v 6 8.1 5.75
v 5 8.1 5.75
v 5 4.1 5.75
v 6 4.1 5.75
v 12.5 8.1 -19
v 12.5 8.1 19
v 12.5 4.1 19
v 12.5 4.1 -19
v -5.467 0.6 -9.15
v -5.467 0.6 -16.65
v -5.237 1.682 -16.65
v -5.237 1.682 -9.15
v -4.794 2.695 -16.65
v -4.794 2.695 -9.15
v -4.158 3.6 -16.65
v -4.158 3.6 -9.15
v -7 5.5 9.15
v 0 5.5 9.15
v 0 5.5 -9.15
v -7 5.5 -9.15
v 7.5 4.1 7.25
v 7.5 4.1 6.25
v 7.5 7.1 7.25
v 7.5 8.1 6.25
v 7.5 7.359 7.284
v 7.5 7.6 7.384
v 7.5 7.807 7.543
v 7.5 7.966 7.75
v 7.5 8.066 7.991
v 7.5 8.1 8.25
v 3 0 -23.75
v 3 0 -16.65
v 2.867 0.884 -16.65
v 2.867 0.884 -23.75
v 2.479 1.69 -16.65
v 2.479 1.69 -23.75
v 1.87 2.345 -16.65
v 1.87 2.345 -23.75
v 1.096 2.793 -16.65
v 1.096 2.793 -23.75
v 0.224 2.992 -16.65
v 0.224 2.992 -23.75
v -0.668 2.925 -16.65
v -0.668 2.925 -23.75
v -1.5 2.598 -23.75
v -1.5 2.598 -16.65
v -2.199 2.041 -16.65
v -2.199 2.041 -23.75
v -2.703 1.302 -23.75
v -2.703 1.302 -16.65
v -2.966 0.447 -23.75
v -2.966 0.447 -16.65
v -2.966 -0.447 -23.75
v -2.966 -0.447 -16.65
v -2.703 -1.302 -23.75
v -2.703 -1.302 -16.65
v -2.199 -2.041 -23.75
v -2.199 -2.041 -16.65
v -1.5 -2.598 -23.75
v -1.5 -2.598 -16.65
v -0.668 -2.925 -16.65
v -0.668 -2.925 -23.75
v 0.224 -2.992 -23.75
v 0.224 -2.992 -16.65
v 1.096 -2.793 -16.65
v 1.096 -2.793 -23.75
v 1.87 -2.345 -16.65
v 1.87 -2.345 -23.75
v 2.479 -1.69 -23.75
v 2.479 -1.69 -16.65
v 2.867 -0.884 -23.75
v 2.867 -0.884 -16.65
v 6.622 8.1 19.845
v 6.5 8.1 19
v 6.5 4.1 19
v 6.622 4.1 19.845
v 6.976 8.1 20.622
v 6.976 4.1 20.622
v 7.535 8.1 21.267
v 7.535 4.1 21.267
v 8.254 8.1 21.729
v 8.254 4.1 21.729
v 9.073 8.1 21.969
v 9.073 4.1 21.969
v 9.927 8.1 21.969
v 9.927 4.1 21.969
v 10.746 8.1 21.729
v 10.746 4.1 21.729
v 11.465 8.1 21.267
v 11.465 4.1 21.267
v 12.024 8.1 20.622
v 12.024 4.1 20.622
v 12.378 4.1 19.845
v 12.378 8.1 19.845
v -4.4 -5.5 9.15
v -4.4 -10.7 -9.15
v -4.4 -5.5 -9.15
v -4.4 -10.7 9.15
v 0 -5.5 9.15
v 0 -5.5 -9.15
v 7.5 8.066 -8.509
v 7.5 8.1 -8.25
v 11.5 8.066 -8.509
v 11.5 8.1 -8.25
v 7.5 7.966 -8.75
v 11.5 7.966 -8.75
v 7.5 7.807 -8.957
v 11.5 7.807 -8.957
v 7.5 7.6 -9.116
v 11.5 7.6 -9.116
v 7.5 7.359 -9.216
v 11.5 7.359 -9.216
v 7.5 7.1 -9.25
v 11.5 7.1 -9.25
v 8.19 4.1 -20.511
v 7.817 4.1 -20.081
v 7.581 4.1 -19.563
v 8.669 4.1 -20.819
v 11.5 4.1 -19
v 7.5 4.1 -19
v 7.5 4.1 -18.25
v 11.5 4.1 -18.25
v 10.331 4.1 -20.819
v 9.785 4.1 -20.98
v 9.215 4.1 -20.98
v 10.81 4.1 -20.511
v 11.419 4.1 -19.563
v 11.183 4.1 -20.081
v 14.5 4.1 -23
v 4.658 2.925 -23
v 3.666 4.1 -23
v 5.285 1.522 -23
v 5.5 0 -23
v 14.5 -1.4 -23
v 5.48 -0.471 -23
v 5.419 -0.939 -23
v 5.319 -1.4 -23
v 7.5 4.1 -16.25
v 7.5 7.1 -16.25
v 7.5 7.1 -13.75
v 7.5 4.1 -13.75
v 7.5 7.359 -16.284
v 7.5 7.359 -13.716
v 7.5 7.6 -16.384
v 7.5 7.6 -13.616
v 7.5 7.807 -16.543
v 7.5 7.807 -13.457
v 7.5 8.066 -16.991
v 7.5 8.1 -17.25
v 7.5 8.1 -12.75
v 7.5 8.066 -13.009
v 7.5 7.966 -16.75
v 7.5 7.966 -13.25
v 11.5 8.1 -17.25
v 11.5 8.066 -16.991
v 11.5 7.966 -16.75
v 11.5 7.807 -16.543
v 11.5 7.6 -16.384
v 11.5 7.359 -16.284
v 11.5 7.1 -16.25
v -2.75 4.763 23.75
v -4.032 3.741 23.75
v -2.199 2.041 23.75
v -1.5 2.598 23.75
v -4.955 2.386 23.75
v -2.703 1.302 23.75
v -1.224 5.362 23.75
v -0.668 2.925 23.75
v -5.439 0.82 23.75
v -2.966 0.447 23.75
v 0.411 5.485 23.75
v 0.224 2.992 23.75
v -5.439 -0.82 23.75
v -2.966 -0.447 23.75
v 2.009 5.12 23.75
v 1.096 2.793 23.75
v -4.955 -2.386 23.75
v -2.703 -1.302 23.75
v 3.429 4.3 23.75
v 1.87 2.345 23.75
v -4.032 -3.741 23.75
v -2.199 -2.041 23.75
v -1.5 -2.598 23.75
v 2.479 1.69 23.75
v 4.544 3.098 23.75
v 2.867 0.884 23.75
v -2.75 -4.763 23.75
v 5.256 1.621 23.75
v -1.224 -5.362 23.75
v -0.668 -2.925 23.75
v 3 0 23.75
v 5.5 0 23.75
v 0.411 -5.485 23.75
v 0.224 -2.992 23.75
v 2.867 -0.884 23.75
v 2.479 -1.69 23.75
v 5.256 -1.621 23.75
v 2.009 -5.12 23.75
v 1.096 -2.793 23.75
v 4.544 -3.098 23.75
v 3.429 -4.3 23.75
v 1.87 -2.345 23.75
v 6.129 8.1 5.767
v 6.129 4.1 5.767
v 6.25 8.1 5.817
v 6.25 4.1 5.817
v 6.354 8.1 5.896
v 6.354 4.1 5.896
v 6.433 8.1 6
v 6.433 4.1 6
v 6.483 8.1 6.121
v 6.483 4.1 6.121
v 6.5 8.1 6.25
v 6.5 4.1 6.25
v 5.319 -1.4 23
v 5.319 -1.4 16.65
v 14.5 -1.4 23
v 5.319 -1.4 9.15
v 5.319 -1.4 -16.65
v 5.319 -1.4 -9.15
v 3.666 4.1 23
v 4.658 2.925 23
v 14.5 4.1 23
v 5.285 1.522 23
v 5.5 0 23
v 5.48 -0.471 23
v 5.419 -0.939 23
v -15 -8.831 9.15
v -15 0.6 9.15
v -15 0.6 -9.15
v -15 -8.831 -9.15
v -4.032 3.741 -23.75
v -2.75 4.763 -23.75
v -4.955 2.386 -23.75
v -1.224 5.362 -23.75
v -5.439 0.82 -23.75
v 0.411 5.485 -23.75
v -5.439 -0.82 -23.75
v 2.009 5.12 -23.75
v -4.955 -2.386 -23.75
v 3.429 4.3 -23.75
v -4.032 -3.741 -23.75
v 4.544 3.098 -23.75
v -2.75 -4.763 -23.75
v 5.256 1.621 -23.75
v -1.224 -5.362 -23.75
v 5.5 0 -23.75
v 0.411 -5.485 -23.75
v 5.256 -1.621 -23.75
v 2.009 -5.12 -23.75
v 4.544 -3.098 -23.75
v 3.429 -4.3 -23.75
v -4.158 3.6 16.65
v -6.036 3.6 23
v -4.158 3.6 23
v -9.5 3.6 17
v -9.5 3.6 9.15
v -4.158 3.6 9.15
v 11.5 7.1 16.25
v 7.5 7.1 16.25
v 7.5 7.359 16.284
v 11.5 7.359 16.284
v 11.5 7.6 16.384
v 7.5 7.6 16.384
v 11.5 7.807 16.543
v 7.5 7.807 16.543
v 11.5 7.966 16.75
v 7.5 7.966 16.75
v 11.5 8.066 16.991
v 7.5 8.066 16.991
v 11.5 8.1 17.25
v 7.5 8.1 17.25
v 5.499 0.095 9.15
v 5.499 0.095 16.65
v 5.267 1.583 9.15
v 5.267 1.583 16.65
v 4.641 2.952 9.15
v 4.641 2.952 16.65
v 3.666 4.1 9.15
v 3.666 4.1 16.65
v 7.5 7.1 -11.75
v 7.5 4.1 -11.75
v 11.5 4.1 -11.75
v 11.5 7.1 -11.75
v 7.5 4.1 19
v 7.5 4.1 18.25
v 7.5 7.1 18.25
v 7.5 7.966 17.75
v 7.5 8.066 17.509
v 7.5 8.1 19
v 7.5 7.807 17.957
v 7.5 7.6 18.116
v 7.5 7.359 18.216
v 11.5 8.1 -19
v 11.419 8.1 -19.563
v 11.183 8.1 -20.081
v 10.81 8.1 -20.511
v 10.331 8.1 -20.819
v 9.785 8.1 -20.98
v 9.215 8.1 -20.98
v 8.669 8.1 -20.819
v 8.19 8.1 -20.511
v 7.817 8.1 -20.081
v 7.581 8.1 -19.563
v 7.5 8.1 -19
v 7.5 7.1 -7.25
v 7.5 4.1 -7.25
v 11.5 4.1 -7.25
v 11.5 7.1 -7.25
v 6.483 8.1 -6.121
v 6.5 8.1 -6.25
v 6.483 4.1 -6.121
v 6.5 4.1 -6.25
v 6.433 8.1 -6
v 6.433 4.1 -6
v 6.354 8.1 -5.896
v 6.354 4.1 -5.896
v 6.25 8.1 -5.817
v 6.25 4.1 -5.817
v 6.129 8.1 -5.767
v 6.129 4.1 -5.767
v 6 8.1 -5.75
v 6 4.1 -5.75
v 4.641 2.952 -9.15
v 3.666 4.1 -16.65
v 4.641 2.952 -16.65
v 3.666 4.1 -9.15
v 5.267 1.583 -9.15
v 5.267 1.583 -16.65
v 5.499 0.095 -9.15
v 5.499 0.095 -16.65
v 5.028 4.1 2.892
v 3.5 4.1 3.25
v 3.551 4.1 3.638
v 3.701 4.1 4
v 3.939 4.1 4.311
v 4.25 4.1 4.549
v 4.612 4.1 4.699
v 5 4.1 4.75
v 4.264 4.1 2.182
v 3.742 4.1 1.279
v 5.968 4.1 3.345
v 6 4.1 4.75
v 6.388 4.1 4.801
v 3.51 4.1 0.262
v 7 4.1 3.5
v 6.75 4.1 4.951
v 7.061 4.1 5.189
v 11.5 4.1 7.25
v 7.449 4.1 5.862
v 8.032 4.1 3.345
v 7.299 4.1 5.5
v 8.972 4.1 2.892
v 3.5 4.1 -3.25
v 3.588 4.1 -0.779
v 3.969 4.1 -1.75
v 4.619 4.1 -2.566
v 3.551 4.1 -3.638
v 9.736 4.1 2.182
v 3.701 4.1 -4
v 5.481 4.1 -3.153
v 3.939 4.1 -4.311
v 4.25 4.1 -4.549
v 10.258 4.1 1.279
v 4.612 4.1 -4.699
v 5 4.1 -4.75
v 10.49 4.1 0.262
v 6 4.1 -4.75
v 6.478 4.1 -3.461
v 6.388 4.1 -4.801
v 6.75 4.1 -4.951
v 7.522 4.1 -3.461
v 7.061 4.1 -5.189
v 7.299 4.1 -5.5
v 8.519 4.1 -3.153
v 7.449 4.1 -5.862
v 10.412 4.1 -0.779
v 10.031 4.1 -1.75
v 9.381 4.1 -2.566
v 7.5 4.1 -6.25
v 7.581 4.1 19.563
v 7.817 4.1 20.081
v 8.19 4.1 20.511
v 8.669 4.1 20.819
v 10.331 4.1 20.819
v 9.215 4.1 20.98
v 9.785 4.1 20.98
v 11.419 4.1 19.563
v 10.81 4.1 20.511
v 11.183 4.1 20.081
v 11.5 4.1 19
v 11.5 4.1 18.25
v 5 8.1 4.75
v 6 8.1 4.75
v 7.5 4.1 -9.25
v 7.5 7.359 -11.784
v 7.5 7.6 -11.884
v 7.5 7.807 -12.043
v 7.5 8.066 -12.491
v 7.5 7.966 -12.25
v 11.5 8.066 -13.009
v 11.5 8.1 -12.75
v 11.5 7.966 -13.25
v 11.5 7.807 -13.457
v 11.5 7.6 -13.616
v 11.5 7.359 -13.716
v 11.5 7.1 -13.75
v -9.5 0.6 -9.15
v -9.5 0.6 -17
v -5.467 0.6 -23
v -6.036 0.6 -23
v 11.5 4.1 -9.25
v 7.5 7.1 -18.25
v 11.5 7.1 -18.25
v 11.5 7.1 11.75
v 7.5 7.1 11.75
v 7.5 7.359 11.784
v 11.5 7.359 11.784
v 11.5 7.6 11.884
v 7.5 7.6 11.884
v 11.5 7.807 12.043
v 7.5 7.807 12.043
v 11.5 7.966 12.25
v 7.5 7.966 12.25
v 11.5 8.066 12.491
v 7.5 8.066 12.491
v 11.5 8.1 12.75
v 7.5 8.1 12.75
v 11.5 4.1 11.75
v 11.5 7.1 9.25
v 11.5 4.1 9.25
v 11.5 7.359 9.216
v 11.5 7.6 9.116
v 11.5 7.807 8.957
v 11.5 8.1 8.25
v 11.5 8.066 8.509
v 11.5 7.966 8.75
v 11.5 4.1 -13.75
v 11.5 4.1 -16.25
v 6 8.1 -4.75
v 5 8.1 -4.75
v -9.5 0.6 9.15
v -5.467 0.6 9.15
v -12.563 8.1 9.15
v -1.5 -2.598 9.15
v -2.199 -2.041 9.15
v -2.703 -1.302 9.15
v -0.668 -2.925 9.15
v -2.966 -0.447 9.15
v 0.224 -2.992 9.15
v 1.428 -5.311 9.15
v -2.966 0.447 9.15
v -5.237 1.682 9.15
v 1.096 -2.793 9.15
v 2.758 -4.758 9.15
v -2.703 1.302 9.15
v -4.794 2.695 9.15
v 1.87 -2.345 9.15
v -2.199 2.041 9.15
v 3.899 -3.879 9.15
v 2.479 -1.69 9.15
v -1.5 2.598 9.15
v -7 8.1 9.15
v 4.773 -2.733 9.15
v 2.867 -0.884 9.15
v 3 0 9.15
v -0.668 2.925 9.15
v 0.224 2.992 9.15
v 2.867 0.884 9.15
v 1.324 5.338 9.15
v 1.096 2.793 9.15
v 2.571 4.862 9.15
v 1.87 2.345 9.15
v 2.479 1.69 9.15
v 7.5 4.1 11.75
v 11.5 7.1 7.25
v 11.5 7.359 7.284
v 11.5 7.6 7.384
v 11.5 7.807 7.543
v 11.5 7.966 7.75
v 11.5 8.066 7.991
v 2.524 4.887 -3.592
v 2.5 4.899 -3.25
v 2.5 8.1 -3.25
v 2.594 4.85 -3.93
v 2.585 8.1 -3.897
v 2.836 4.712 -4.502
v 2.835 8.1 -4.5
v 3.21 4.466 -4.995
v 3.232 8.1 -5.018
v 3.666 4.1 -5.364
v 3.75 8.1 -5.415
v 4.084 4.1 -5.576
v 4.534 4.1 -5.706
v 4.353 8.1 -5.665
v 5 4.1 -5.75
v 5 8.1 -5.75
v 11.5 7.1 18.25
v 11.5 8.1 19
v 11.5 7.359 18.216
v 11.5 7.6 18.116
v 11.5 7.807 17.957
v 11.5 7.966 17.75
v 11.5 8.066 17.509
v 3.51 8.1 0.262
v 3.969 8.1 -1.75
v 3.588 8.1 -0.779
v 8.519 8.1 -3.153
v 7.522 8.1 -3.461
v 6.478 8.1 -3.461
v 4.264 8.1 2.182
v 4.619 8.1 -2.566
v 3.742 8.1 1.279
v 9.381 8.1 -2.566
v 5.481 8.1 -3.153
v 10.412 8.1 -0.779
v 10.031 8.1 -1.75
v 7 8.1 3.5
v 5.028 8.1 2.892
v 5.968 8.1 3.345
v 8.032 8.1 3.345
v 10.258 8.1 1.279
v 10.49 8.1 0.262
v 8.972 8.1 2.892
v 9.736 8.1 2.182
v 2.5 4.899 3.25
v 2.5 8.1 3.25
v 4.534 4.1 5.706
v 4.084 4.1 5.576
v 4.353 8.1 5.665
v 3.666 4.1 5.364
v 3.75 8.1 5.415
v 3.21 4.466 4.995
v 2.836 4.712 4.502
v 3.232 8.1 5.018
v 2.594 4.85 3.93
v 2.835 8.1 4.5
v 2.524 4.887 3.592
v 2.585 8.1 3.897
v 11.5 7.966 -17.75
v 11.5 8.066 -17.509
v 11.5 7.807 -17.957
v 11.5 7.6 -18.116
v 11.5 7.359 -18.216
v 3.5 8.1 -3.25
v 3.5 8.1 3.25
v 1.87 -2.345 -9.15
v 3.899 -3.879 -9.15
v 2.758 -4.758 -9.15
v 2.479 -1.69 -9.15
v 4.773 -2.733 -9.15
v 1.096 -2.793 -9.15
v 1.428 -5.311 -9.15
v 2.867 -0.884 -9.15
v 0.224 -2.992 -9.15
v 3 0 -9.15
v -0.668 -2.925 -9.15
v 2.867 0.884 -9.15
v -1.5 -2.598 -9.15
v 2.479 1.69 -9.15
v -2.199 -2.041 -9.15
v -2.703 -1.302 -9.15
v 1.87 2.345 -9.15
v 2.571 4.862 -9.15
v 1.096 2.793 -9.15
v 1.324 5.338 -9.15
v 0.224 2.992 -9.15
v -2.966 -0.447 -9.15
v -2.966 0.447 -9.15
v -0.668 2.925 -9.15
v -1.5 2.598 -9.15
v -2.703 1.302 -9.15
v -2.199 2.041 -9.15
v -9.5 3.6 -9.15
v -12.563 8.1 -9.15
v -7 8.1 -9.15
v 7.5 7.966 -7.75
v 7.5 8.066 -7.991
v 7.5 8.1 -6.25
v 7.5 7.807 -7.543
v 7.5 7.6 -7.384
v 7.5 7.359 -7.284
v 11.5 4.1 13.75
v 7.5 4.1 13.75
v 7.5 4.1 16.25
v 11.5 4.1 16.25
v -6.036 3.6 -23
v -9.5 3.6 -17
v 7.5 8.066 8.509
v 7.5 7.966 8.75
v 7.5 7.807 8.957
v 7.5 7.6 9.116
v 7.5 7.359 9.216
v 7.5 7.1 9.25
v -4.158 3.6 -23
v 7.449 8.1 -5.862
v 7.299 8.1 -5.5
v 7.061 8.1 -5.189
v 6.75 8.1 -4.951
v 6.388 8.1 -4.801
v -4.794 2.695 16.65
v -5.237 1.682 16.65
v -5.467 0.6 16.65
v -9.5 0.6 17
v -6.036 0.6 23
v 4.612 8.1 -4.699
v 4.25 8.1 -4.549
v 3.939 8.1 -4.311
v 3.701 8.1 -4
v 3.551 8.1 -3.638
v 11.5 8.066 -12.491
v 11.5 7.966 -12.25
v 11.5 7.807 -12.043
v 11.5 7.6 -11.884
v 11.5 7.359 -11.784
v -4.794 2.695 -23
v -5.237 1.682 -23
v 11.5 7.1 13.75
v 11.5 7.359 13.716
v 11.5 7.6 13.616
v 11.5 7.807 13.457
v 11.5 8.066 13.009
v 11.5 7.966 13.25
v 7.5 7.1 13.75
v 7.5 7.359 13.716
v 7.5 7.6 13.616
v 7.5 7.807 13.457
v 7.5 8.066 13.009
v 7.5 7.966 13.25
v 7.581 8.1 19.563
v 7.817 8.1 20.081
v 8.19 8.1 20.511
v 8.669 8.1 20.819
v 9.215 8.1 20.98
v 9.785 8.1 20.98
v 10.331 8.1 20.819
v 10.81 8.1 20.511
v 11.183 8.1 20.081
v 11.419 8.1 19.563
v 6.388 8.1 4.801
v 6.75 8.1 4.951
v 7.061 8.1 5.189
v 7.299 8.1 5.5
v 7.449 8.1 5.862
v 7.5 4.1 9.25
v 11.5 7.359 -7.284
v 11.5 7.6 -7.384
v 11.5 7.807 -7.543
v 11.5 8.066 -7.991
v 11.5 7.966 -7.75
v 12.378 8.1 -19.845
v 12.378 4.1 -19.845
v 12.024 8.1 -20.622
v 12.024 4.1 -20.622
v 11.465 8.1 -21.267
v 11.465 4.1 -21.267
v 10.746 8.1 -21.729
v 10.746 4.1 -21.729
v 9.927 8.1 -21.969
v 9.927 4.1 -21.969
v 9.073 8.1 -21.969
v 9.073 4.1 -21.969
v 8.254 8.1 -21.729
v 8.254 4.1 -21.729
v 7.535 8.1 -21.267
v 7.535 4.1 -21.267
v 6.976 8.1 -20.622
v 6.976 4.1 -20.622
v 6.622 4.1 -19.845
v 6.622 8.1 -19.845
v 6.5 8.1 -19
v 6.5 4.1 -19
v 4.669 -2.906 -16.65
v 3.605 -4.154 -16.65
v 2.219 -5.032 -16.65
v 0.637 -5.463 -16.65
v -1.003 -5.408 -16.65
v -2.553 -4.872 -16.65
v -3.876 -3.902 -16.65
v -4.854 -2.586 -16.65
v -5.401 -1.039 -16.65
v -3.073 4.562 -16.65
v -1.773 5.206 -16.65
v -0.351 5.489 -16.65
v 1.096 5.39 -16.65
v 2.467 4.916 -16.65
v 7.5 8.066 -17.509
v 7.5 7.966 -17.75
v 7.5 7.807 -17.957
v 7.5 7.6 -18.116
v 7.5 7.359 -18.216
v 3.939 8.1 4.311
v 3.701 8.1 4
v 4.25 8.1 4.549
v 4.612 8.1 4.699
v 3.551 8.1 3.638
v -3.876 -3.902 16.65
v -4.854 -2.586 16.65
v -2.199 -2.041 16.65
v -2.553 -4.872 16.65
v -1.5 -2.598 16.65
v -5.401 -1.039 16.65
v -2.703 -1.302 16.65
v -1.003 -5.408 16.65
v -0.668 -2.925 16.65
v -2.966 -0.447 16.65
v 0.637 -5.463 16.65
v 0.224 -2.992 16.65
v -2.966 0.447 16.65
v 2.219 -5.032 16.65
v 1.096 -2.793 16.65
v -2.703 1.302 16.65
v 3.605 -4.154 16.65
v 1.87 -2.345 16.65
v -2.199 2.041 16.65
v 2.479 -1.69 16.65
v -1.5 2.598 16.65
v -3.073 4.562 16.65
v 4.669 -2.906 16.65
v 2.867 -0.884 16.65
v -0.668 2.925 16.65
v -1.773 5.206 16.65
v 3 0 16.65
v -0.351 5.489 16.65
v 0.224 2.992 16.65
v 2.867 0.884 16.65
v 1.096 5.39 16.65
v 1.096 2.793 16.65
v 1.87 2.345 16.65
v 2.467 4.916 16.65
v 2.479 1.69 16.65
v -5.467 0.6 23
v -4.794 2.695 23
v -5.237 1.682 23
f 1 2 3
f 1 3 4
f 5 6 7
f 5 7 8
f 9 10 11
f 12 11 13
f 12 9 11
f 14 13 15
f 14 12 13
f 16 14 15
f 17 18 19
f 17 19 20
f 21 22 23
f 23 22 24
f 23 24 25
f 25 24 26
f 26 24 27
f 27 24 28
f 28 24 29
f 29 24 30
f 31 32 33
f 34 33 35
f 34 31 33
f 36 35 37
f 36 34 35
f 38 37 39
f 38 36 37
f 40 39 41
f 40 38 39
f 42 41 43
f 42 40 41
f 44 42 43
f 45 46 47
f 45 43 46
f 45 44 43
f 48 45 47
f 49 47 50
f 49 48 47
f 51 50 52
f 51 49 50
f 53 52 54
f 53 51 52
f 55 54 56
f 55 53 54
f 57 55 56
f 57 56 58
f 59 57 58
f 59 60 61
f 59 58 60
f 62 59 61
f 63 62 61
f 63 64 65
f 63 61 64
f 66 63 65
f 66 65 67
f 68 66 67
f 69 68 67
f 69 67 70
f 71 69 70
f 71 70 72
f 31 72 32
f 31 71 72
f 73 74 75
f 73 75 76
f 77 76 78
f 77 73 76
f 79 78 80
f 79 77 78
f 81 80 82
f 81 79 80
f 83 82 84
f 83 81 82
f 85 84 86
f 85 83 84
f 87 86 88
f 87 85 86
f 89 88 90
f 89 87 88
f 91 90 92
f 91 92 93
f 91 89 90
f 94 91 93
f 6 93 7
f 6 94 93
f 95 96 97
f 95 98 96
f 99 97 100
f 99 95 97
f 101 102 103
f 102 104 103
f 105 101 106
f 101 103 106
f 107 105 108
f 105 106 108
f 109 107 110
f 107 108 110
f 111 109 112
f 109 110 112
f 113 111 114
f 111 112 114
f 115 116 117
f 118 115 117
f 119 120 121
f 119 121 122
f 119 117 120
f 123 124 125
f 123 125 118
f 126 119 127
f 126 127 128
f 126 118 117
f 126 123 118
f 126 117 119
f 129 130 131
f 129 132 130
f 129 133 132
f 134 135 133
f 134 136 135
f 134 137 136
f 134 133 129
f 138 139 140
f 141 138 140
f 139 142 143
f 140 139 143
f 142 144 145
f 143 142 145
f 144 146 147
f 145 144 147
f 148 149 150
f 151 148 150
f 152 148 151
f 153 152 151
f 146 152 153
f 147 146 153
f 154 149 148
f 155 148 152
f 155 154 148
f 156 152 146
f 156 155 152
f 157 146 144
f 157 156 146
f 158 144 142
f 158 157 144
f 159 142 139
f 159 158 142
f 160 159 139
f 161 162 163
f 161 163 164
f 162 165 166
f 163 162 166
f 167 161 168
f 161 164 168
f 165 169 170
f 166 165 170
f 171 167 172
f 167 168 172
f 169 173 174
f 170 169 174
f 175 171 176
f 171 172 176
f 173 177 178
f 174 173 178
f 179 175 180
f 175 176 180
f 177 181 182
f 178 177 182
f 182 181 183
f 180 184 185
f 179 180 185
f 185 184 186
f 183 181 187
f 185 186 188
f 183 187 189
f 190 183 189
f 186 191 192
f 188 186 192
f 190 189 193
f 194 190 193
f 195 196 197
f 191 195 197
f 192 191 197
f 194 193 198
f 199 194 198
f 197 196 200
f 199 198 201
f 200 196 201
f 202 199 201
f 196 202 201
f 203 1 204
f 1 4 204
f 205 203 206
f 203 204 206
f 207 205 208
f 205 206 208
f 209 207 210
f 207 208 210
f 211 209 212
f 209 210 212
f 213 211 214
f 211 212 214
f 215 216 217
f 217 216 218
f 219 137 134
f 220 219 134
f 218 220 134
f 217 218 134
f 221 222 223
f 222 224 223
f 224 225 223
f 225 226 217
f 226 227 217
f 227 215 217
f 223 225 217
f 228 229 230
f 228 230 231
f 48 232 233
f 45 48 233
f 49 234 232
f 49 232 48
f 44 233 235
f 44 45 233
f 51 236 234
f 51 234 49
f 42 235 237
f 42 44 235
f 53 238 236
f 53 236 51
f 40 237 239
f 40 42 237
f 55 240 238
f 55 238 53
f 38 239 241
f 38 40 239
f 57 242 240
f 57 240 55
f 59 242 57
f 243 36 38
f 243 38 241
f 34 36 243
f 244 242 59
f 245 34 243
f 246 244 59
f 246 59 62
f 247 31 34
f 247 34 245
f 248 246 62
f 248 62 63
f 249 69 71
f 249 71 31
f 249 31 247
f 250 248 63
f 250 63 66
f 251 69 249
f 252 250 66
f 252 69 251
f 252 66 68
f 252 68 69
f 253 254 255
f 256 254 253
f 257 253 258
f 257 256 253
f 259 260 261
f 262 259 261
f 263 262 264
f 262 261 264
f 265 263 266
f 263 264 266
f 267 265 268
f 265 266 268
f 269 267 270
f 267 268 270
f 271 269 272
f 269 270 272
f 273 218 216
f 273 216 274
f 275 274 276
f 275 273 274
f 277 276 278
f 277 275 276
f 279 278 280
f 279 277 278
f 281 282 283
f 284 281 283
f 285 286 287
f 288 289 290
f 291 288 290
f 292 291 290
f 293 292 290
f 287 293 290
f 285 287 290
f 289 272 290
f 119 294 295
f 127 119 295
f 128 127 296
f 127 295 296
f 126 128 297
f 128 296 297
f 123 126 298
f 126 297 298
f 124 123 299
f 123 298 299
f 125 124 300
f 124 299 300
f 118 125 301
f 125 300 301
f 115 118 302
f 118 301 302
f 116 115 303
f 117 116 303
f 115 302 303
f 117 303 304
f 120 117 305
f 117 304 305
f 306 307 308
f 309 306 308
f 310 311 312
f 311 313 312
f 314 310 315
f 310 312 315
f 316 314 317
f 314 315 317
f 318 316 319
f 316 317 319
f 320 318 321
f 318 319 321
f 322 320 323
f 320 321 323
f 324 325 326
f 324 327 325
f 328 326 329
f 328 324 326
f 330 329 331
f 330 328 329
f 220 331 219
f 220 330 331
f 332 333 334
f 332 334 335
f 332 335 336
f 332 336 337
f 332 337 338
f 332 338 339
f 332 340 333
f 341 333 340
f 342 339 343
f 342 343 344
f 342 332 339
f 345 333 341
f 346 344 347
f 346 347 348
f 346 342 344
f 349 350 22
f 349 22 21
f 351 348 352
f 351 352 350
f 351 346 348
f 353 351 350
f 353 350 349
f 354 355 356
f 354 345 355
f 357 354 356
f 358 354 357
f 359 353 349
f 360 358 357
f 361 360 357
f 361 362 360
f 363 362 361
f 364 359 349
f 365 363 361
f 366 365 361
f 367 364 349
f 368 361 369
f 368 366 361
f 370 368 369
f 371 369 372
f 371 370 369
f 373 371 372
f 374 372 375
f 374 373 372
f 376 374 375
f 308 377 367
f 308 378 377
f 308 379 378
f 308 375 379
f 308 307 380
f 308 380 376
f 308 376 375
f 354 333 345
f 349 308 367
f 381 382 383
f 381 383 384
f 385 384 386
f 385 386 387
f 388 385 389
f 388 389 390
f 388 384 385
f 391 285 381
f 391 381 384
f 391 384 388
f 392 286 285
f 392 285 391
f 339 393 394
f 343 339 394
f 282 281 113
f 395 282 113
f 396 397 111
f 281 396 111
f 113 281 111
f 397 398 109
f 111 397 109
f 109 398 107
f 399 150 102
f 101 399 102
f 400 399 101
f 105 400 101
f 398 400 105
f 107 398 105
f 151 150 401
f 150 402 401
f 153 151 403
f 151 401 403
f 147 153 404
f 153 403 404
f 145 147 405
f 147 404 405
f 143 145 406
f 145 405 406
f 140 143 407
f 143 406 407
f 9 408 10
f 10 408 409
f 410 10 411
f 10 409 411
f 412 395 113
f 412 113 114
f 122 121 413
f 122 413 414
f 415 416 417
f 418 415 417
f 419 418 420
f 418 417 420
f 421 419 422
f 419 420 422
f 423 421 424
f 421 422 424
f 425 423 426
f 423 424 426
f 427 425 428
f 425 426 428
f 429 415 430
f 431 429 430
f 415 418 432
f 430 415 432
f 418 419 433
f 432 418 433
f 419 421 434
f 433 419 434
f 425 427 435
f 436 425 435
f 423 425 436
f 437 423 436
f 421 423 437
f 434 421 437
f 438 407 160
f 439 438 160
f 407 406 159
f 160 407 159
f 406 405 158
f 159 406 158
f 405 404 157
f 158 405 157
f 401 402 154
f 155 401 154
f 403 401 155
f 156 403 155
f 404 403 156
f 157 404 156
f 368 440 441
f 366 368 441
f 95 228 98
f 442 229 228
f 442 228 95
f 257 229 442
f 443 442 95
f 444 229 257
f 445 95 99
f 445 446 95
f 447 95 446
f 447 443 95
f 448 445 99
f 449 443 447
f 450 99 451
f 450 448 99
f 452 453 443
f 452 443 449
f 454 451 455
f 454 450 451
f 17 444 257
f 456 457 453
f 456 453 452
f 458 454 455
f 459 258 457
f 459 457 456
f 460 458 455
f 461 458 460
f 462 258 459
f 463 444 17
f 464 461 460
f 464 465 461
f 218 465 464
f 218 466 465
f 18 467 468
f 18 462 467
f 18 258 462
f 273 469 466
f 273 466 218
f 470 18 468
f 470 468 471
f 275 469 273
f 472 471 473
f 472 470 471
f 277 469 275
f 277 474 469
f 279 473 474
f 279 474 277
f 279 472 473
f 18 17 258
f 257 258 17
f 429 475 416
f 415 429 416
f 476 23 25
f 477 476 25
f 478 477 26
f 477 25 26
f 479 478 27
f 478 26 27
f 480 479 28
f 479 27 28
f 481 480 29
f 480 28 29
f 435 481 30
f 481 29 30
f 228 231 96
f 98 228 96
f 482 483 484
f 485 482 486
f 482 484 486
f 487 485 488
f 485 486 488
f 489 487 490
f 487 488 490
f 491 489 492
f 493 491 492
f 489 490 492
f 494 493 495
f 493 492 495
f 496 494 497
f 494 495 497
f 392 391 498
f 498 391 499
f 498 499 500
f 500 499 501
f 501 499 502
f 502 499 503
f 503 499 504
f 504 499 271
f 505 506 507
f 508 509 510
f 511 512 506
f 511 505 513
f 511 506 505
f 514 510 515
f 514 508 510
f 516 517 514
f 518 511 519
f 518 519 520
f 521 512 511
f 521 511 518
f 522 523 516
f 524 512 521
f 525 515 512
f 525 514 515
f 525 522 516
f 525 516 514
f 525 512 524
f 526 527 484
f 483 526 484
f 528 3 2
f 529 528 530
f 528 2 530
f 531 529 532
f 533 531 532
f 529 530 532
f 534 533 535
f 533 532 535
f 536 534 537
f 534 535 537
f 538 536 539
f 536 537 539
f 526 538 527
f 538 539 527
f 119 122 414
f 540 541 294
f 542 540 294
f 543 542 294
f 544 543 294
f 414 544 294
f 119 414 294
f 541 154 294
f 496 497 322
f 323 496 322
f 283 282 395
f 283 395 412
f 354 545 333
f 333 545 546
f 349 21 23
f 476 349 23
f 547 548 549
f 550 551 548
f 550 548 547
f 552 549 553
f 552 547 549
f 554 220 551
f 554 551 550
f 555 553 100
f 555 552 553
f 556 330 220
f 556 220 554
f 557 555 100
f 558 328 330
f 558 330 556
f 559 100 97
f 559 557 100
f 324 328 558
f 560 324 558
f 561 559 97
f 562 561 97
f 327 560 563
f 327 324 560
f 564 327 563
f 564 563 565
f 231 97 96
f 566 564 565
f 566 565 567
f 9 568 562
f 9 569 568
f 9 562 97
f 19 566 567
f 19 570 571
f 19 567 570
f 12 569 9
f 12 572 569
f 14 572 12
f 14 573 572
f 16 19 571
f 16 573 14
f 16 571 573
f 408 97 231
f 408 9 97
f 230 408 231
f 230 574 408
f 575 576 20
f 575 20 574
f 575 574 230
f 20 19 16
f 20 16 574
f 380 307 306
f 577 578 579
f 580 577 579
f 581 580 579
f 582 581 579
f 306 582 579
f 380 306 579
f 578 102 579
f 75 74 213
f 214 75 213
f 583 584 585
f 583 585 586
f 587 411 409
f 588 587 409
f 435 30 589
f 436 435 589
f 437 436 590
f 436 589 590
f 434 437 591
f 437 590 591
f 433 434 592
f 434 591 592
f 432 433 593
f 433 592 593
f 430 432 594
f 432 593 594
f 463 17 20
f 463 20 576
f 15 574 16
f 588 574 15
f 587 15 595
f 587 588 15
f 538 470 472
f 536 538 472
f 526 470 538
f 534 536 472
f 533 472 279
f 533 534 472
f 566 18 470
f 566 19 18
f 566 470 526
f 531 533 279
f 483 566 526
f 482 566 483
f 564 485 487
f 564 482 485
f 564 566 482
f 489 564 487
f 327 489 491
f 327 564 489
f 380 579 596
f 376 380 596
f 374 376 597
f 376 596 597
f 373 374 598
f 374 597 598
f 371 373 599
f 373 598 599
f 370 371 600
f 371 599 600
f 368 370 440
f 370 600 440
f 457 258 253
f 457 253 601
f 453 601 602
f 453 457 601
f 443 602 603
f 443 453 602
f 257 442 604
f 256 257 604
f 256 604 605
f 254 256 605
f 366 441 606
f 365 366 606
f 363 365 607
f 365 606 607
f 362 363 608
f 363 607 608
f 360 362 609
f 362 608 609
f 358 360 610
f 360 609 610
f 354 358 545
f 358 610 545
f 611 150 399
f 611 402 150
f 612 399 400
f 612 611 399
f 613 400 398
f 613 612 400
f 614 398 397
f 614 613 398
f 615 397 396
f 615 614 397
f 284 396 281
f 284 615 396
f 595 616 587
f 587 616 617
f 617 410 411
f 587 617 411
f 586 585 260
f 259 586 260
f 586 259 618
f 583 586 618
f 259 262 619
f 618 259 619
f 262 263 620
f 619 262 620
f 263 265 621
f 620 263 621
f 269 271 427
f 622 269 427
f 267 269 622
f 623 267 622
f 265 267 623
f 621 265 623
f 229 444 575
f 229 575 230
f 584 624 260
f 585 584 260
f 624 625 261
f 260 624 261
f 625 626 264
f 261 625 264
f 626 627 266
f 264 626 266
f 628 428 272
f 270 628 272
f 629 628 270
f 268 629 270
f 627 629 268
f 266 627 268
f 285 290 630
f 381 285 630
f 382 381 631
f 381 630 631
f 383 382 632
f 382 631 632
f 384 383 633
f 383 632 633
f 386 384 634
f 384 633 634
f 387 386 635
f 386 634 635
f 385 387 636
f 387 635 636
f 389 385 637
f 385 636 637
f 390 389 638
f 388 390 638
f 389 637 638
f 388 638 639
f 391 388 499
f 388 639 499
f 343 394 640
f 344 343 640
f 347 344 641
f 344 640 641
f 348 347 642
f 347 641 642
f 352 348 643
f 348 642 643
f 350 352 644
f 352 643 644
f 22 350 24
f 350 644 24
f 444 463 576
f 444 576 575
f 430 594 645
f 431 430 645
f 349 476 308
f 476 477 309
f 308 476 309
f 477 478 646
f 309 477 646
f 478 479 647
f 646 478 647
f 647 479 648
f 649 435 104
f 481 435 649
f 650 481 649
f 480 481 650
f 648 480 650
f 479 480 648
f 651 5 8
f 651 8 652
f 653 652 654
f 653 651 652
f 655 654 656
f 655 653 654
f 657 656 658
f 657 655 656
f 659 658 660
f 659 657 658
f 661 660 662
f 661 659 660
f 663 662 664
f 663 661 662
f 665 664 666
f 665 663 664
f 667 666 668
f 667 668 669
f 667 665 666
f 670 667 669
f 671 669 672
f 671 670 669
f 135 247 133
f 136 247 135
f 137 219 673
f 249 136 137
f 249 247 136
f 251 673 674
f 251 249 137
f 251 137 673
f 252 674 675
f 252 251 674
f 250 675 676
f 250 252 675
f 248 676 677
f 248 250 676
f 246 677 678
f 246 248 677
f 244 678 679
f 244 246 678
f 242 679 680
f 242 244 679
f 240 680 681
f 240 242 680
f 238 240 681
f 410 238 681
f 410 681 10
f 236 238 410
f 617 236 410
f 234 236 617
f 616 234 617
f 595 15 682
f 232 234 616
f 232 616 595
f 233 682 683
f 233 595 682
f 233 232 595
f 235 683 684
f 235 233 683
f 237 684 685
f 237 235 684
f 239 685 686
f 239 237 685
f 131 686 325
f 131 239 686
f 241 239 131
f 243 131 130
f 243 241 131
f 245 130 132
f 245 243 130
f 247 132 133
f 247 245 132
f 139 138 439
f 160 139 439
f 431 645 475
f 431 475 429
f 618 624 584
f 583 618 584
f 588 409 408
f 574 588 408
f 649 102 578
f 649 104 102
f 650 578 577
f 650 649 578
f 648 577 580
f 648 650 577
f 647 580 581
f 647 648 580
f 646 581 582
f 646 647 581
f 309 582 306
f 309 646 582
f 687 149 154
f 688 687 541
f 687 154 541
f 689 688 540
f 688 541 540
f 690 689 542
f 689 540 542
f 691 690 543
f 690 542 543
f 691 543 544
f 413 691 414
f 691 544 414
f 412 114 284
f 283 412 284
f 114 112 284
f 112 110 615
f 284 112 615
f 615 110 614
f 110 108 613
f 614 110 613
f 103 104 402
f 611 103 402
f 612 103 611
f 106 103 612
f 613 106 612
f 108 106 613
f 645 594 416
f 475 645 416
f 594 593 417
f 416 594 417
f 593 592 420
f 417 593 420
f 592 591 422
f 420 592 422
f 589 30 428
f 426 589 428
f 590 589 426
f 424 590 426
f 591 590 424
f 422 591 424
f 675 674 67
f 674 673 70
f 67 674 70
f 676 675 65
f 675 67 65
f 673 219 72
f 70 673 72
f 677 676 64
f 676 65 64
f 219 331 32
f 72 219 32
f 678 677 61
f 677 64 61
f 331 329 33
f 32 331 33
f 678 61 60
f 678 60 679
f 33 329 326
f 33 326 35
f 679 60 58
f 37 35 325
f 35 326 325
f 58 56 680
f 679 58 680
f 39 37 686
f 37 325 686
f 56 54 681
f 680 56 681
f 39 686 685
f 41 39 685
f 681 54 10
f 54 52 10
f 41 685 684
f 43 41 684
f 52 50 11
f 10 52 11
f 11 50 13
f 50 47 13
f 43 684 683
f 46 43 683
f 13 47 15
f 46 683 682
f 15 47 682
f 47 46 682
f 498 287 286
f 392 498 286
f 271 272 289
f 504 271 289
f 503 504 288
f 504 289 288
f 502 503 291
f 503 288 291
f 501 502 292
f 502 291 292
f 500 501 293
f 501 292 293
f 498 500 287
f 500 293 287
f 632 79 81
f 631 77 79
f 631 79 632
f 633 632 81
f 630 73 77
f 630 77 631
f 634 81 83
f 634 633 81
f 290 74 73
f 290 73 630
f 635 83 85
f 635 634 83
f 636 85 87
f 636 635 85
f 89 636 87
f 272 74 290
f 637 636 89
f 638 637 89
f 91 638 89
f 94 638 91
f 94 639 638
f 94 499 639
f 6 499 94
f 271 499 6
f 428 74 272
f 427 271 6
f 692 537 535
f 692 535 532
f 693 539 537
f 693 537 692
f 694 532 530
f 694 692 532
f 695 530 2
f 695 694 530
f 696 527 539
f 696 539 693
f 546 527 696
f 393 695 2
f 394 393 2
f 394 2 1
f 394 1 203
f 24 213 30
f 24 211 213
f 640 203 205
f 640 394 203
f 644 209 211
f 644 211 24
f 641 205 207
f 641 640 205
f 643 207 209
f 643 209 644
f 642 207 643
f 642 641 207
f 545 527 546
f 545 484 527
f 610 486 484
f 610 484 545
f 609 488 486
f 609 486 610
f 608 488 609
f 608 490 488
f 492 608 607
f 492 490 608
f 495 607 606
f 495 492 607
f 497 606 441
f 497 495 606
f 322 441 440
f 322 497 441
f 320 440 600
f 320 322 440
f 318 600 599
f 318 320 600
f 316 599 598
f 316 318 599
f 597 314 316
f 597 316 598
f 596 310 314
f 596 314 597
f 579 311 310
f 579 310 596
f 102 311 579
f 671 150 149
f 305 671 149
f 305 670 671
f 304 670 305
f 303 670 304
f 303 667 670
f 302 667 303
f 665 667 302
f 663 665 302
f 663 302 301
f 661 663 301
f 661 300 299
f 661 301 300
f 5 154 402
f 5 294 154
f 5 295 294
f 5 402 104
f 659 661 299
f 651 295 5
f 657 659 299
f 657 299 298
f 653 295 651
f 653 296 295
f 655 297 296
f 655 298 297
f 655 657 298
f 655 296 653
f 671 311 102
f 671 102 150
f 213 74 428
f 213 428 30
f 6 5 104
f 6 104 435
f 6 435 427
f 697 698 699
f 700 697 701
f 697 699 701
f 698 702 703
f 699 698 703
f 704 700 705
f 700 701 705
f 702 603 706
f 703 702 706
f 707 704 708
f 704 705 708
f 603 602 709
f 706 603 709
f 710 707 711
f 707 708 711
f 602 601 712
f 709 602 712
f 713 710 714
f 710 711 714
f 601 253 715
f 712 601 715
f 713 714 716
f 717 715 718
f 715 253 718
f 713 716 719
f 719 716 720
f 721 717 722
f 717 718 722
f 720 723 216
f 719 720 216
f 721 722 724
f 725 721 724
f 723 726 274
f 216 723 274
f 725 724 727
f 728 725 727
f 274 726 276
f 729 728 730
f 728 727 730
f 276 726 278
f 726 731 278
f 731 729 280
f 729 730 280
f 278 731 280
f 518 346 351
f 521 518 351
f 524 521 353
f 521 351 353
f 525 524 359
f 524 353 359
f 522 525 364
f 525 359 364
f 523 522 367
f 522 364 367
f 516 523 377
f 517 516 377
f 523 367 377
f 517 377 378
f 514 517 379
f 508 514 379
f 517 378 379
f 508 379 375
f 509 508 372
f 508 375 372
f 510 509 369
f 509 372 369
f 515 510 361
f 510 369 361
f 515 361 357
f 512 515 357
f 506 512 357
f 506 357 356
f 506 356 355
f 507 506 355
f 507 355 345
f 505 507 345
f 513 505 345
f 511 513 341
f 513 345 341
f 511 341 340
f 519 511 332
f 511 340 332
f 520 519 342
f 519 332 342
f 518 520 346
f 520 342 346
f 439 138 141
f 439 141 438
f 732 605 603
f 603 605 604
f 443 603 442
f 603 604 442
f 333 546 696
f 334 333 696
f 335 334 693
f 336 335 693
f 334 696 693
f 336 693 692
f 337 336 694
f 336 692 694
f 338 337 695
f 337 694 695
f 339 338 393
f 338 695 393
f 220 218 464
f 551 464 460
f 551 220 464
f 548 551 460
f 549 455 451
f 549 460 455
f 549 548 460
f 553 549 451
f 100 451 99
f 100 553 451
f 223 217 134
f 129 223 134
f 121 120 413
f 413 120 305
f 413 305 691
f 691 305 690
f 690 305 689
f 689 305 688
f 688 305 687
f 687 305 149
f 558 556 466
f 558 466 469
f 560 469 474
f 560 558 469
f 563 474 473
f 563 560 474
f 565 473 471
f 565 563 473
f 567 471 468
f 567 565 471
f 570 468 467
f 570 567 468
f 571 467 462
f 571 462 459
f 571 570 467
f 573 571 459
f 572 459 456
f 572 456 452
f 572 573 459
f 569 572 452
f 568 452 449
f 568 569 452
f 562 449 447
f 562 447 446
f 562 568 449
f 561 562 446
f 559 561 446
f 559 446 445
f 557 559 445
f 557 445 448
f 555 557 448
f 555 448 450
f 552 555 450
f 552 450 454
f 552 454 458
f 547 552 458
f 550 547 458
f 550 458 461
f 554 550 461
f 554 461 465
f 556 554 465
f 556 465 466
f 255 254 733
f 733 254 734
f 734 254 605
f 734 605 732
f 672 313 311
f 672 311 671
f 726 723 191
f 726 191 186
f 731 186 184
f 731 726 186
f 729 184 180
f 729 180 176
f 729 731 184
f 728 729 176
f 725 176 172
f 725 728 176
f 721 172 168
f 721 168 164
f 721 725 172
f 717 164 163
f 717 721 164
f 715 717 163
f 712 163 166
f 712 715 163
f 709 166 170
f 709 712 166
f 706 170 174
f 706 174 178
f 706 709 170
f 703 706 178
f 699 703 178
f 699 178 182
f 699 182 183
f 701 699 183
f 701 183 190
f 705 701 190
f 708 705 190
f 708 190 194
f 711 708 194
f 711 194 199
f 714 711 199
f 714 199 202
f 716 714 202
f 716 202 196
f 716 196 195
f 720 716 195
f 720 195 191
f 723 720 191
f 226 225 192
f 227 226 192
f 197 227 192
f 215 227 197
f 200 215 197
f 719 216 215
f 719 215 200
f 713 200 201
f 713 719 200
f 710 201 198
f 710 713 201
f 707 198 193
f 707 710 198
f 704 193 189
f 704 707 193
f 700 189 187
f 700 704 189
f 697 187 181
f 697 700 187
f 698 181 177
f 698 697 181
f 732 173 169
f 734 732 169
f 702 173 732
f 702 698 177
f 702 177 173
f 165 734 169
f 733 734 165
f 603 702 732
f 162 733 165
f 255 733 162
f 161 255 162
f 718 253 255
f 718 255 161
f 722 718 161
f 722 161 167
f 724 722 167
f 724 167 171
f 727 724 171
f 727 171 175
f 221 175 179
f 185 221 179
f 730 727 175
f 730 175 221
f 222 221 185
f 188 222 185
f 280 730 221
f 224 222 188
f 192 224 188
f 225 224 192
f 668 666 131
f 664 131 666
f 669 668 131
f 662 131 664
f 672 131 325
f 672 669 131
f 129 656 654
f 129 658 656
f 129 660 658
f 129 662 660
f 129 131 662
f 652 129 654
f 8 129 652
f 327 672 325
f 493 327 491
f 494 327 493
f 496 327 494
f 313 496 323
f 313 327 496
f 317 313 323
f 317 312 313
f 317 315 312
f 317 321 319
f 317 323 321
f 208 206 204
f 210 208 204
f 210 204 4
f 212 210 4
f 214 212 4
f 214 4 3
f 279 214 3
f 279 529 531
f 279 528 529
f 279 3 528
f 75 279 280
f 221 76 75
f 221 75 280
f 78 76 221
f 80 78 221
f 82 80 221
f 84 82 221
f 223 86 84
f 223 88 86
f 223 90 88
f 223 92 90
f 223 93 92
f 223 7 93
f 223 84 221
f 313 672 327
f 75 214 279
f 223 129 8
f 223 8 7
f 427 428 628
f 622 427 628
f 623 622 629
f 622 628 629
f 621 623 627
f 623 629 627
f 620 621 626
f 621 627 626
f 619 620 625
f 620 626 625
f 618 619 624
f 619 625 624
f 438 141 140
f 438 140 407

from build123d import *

# Parameters (mm, degrees)
BOSS_EXTRUDE1_DEPTH    = 9.15
BOSS_EXTRUDE2_DEPTH    = 3
BOSS_EXTRUDE3_START    = -23
SKETCH4_R              = 5.5
BOSS_EXTRUDE3_DEPTH    = 23.75
MOVE_START             = 3.6
MOVE_FACE1_OUTLINE_W   = 12.5
MOVE_FACE1_OUTLINE_H   = 46
MOVE_FACE1_DEPTH       = 0.5
MOVE_START_2           = -1.4
MOVE_FACE2_OUTLINE_W   = 10.5
MOVE_FACE2_OUTLINE_H   = 46
MOVE_FACE2_DEPTH       = 2
SKETCH7_R              = 5.5
CUT_EXTRUDE1_DEPTH     = 7.5
HOLE2_START            = -23.75
HOLE2_OUTLINE_R        = 3
HOLE2_DEPTH            = 47.5
BOSS_EXTRUDE4_REACH    = 35.801
SKETCH10_W             = 4
SKETCH10_H             = 11.5
FILLET1_R              = 2.5
FILLET3_R              = 0.5
CUT_EXTRUDE2_DEPTH     = 4
SKETCH12_W             = 6
SKETCH12_H             = 2
BOSS_EXTRUDE5_DEPTH    = 4
FILLET2_R              = 1
LPATTERN2_COUNT        = 3
LPATTERN2_PITCH        = 4.5
FILLET2_OF_LPATTERN2_R = 1
SKETCH13_R             = 3.5
BOSS_EXTRUDE13_DEPTH   = 4
MIRROR1_START          = 7.5
MIRROR1_DEPTH          = 4
MIRROR1_START_2        = 9.15
MIRROR1_2_OUTLINE_R    = 3
MIRROR1_2_DEPTH        = 7.5


# Read off the part's stored shape, not the designer's step: Move Face1, Move Face2, Hole2, Mirror1
# Some blends are built 0.0001 mm under size
with BuildPart() as part:
    # Sketch1 → Boss-Extrude1 (new, symmetric)
    with BuildSketch(Plane.XY):
        with BuildLine():
            Line((-4.4, -5.5), (0, -5.5))
            ThreePointArc((0, -5.5), (5.5, 0), (0, 5.5))
            Line((0, 5.5), (-7, 5.5))
            Line((-7, 5.5), (-7, 8.1))
            Line((-7, 8.1), (-12.563102278, 8.1))
            Line((-12.563102278, 8.1), (-15, 0.6))
            Line((-15, 0.6), (-15, -8.830934004))
            Line((-15, -8.830934004), (-4.4, -10.7))
            Line((-4.4, -10.7), (-4.4, -5.5))
        make_face()
    extrude(amount=BOSS_EXTRUDE1_DEPTH, both=True)

    # Sketch3 → Boss-Extrude2 (add)
    with BuildSketch(Plane(origin=(0, 0.6, 0), x_dir=(0, 0, -1), z_dir=(0, 1, 0))):
        Polygon((17, 9.5), (-17, 9.5), (-23, 6.035898385), (-23, -14.5), (23, -14.5), (23, 6.035898385), align=None)
    extrude(amount=BOSS_EXTRUDE2_DEPTH)

    # Sketch4 → Boss-Extrude3 (add, symmetric)
    with BuildSketch(Plane(origin=(0, 0, -23), x_dir=(-1, 0, 0), z_dir=(0, 0, -1)).offset(BOSS_EXTRUDE3_START)):
        with Locations(Location((0, 0, 0), (0, 0, 180))):
            Circle(SKETCH4_R)
    extrude(amount=BOSS_EXTRUDE3_DEPTH, both=True)

    # Move Face1 outline → Move Face1 (add)
    with BuildSketch(Plane(origin=(0, 0, 0), x_dir=(1, 0, 0), z_dir=(0, 1, 0)).offset(MOVE_START)):
        with Locations((8.25, 0)):
            Rectangle(MOVE_FACE1_OUTLINE_W, MOVE_FACE1_OUTLINE_H)
    extrude(amount=MOVE_FACE1_DEPTH)

    # Move Face2 outline → Move Face2 (add)
    with BuildSketch(Plane(origin=(0, 0, 0), x_dir=(1, 0, 0), z_dir=(0, 1, 0)).offset(MOVE_START_2)):
        with Locations((9.25, 0)):
            Rectangle(MOVE_FACE2_OUTLINE_W, MOVE_FACE2_OUTLINE_H)
    extrude(amount=MOVE_FACE2_DEPTH)

    # Sketch7 → Cut-Extrude1 (cut)
    with BuildSketch(Plane(origin=(0, 0, -9.15), x_dir=(-1, 0, 0), z_dir=(0, 0, -1))):
        with Locations(Location((0, 0, 0), (0, 0, 6.262913126))):
            Circle(SKETCH7_R)
    extrude(amount=CUT_EXTRUDE1_DEPTH, mode=Mode.SUBTRACT)

    # Hole2 outline → Hole2 (cut)
    with BuildSketch(Plane.XY.offset(HOLE2_START)):
        Circle(HOLE2_OUTLINE_R)
    extrude(amount=HOLE2_DEPTH, mode=Mode.SUBTRACT)

    # Boss-Extrude4: up to this face of the body (flat: up to its plane)
    boss_extrude4_end = Plane(part.part.faces().sort_by_distance((9.083030278, 4.1, 0))[0])
    # Sketch10 → Boss-Extrude4 (add, up to the picked face)
    with BuildSketch(Plane(origin=(0, 8.1, 0), x_dir=(1, 0, 0), z_dir=(0, 1, 0)), mode=Mode.PRIVATE) as boss_extrude4_sk1:
        with BuildLine():
            Line((12.5, -19), (12.5, 19))
            ThreePointArc((12.5, 19), (9.5, 22), (6.5, 19))
            Line((6.5, 19), (6.5, 5.75))
            Line((6.5, 5.75), (10.5, 5.75))
            Line((10.5, 5.75), (10.5, -5.75))
            Line((10.5, -5.75), (6.5, -5.75))
            Line((6.5, -5.75), (6.5, -19))
            ThreePointArc((6.5, -19), (9.5, -22), (12.5, -19))
        make_face()
    boss_extrude4_tool1 = split(extrude(boss_extrude4_sk1.sketch, amount=-BOSS_EXTRUDE4_REACH, mode=Mode.PRIVATE), bisect_by=boss_extrude4_end, keep=Keep.BOTH, mode=Mode.PRIVATE)
    # Sketch10 → Boss-Extrude4 (add, up to the picked face)
    with BuildSketch(Plane(origin=(0, 8.1, 0), x_dir=(1, 0, 0), z_dir=(0, 1, 0)), mode=Mode.PRIVATE) as boss_extrude4_sk2:
        with Locations((8.5, 0)):
            Rectangle(SKETCH10_W, SKETCH10_H)
    boss_extrude4_tool2 = split(extrude(boss_extrude4_sk2.sketch, amount=-BOSS_EXTRUDE4_REACH, mode=Mode.PRIVATE), bisect_by=boss_extrude4_end, keep=Keep.BOTH, mode=Mode.PRIVATE)
    # Sketch10 → Boss-Extrude4 (add, up to the picked face)
    with BuildSketch(Plane(origin=(0, 8.1, 0), x_dir=(1, 0, 0), z_dir=(0, 1, 0)), mode=Mode.PRIVATE) as boss_extrude4_sk3:
        with Locations((4.5, 0)):
            Rectangle(SKETCH10_W, SKETCH10_H)
    boss_extrude4_tool3 = split(extrude(boss_extrude4_sk3.sketch, amount=-BOSS_EXTRUDE4_REACH, mode=Mode.PRIVATE), bisect_by=boss_extrude4_end, keep=Keep.BOTH, mode=Mode.PRIVATE)
    add(boss_extrude4_tool1.solids().sort_by(Axis((12.055928, 8.1, 0), (0, -1, 0)))[0])
    add(boss_extrude4_tool2.solids().sort_by(Axis((8.5, 8.1, 0), (0, -1, 0)))[0])
    add(boss_extrude4_tool3.solids().sort_by(Axis((4.5, 8.1, 0), (0, -1, 0)))[0])

    # Fillet1
    # the kernel refuses this fillet: 2.5 mm, written as the material it takes off along each edge
    with BuildSketch(Plane(origin=(2.5, 14.35, -5.75), x_dir=(1, 0, 0), z_dir=(0, -1, 0))) as fillet1_piece_1_section:
        with BuildLine():
            CenterArc((FILLET1_R, FILLET1_R), FILLET1_R, 180, 90)
            Line((0, FILLET1_R), (0, 0))
            Line((0, 0), (FILLET1_R, 0))
        make_face()
    fillet1_piece_1 = extrude(amount=15.701020514, mode=Mode.PRIVATE)
    fillet1_piece_1 = fillet1_piece_1 - Plane(origin=(0, 0, -5.193529693), x_dir=(0, -1, 0), z_dir=(0, 0, 1)) * Cylinder(5.5, 42, mode=Mode.PRIVATE)
    fillet1_piece_1 = split(fillet1_piece_1, bisect_by=Plane(origin=(3.08088975, 4.1, -5.193529693), z_dir=(0, 1, 0)), keep=Keep.TOP, mode=Mode.PRIVATE)
    add(fillet1_piece_1, mode=Mode.SUBTRACT)
    with BuildSketch(Plane(origin=(2.5, 14.35, 5.75), x_dir=(0, 0, -1), z_dir=(0, -1, 0))) as fillet1_piece_2_section:
        with BuildLine():
            CenterArc((FILLET1_R, FILLET1_R), FILLET1_R, 180, 90)
            Line((0, FILLET1_R), (0, 0))
            Line((0, 0), (FILLET1_R, 0))
        make_face()
    fillet1_piece_2 = extrude(amount=15.701020514, mode=Mode.PRIVATE)
    fillet1_piece_2 = fillet1_piece_2 - Plane(origin=(0, 0, 5.193529696), x_dir=(0, -1, 0), z_dir=(0, 0, 1)) * Cylinder(5.5, 42, mode=Mode.PRIVATE)
    fillet1_piece_2 = split(fillet1_piece_2, bisect_by=Plane(origin=(3.080889748, 4.1, 5.193529696), z_dir=(0, 1, 0)), keep=Keep.TOP, mode=Mode.PRIVATE)
    add(fillet1_piece_2, mode=Mode.SUBTRACT)

    # Fillet3
    fillet3_edges = [part.edges().sort_by_distance(p)[0] for p in [
        (6.5, 6.1, 5.75),
        (6.5, 6.1, -5.75),
    ]]
    fillet(fillet3_edges, radius=FILLET3_R)

    # Sketch11 → Cut-Extrude2 (cut)
    with BuildSketch(Plane(origin=(0, 8.1, 0), x_dir=(1, 0, 0), z_dir=(0, 1, 0))):
        with BuildLine():
            Line((6, 4.75), (5, 4.75))
            ThreePointArc((5, 4.75), (3.939339828, 4.310660172), (3.5, 3.25))
            Line((3.5, 3.25), (3.5, -3.25))
            ThreePointArc((3.5, -3.25), (3.939339828, -4.310660172), (5, -4.75))
            Line((5, -4.75), (6, -4.75))
            ThreePointArc((6, -4.75), (7.060660172, -5.189339828), (7.5, -6.25))
            Line((7.5, -6.25), (7.5, -19))
            ThreePointArc((7.5, -19), (9.5, -21), (11.5, -19))
            Line((11.5, -19), (11.5, 19))
            ThreePointArc((11.5, 19), (9.5, 21), (7.5, 19))
            Line((7.5, 19), (7.5, 6.25))
            ThreePointArc((7.5, 6.25), (7.060660172, 5.189339828), (6, 4.75))
        make_face()
    extrude(amount=-CUT_EXTRUDE2_DEPTH, mode=Mode.SUBTRACT)

    # Sketch12 → Boss-Extrude5 (add)
    with BuildSketch(Plane(origin=(0, 4.1, 0), x_dir=(1, 0, 0), z_dir=(0, 1, 0))):
        with Locations((9.5, 17.25)):
            Rectangle(SKETCH12_W, SKETCH12_H)
    boss_extrude5 = extrude(amount=BOSS_EXTRUDE5_DEPTH)

    # Fillet2
    fillet2_edges = [part.edges().sort_by_distance(p)[0] for p in [
        (9.5, 8.1, -18.25),
        (9.5, 8.1, -16.25),
    ]]
    fillet(fillet2_edges, radius=FILLET2_R - 0.0001)  # a hair under: the kernel refuses the full size

    # LPattern2: Boss-Extrude5 ×3
    with Locations(*[(0, 0, i * LPATTERN2_PITCH) for i in range(1, LPATTERN2_COUNT)]):
        add(boss_extrude5)

    # Fillet2 of LPattern2
    fillet2_of_lpattern2_edges = [part.edges().sort_by_distance(p)[0] for p in [
        (9.5, 8.1, -13.75),
        (9.5, 8.1, -11.75),
        (9.5, 8.1, -9.25),
        (9.5, 8.1, -7.25),
    ]]
    fillet(fillet2_of_lpattern2_edges, radius=FILLET2_OF_LPATTERN2_R - 0.0001)  # a hair under: the kernel refuses the full size

    # Sketch13 → Boss-Extrude13 (add)
    with BuildSketch(Plane(origin=(0, 4.1, 0), x_dir=(1, 0, 0), z_dir=(0, 1, 0))):
        with Locations(Location((7.00001, 0, 0), (0, 0, 270))):
            Circle(SKETCH13_R)
    extrude(amount=BOSS_EXTRUDE13_DEPTH)

    # Mirror1 outline → Mirror1 (add)
    with BuildSketch(Plane.YZ.offset(MIRROR1_START)):
        with BuildLine():
            ThreePointArc((8.1, 17.25), (7.807106781, 17.957106781), (7.1, 18.25))
            Line((7.1, 18.25), (4.1, 18.25))
            Line((4.1, 18.25), (4.1, 16.25))
            Line((4.1, 16.25), (7.1, 16.25))
            ThreePointArc((7.1, 16.25), (7.807106781, 16.542893219), (8.1, 17.25))
        make_face()
        with BuildLine():
            Line((7.1, 9.25), (4.1, 9.25))
            Line((4.1, 9.25), (4.1, 7.25))
            Line((4.1, 7.25), (7.1, 7.25))
            ThreePointArc((7.1, 7.25), (7.807106781, 7.542893219), (8.1, 8.25))
            ThreePointArc((8.1, 8.25), (7.807106781, 8.957106781), (7.1, 9.25))
        make_face()
        with BuildLine():
            Line((7.1, 13.75), (4.1, 13.75))
            Line((4.1, 13.75), (4.1, 11.75))
            Line((4.1, 11.75), (7.1, 11.75))
            ThreePointArc((7.1, 11.75), (7.807106781, 12.042893219), (8.1, 12.75))
            ThreePointArc((8.1, 12.75), (7.807106781, 13.457106781), (7.1, 13.75))
        make_face()
    extrude(amount=MIRROR1_DEPTH)

    # Mirror1 2 outline → Mirror1 2 (cut)
    with BuildSketch(Plane.XY.offset(MIRROR1_START_2)):
        with BuildLine():
            ThreePointArc((5.318834459, -1.4), (5.267312845, 1.582850401), (3.666060556, 4.1))
            ThreePointArc((3.666060556, 4.1), (-0.350758821, 5.4888039), (-4.158124577, 3.6))
            ThreePointArc((-4.158124577, 3.6), (-5.040991658, 2.199637039), (-5.467174773, 0.6))
            ThreePointArc((-5.467174773, 0.6), (-1.002746834, -5.407818302), (5.318834459, -1.4))
        make_face()
        Circle(MIRROR1_2_OUTLINE_R, mode=Mode.SUBTRACT)
    extrude(amount=MIRROR1_2_DEPTH, mode=Mode.SUBTRACT)


solid = part.part
